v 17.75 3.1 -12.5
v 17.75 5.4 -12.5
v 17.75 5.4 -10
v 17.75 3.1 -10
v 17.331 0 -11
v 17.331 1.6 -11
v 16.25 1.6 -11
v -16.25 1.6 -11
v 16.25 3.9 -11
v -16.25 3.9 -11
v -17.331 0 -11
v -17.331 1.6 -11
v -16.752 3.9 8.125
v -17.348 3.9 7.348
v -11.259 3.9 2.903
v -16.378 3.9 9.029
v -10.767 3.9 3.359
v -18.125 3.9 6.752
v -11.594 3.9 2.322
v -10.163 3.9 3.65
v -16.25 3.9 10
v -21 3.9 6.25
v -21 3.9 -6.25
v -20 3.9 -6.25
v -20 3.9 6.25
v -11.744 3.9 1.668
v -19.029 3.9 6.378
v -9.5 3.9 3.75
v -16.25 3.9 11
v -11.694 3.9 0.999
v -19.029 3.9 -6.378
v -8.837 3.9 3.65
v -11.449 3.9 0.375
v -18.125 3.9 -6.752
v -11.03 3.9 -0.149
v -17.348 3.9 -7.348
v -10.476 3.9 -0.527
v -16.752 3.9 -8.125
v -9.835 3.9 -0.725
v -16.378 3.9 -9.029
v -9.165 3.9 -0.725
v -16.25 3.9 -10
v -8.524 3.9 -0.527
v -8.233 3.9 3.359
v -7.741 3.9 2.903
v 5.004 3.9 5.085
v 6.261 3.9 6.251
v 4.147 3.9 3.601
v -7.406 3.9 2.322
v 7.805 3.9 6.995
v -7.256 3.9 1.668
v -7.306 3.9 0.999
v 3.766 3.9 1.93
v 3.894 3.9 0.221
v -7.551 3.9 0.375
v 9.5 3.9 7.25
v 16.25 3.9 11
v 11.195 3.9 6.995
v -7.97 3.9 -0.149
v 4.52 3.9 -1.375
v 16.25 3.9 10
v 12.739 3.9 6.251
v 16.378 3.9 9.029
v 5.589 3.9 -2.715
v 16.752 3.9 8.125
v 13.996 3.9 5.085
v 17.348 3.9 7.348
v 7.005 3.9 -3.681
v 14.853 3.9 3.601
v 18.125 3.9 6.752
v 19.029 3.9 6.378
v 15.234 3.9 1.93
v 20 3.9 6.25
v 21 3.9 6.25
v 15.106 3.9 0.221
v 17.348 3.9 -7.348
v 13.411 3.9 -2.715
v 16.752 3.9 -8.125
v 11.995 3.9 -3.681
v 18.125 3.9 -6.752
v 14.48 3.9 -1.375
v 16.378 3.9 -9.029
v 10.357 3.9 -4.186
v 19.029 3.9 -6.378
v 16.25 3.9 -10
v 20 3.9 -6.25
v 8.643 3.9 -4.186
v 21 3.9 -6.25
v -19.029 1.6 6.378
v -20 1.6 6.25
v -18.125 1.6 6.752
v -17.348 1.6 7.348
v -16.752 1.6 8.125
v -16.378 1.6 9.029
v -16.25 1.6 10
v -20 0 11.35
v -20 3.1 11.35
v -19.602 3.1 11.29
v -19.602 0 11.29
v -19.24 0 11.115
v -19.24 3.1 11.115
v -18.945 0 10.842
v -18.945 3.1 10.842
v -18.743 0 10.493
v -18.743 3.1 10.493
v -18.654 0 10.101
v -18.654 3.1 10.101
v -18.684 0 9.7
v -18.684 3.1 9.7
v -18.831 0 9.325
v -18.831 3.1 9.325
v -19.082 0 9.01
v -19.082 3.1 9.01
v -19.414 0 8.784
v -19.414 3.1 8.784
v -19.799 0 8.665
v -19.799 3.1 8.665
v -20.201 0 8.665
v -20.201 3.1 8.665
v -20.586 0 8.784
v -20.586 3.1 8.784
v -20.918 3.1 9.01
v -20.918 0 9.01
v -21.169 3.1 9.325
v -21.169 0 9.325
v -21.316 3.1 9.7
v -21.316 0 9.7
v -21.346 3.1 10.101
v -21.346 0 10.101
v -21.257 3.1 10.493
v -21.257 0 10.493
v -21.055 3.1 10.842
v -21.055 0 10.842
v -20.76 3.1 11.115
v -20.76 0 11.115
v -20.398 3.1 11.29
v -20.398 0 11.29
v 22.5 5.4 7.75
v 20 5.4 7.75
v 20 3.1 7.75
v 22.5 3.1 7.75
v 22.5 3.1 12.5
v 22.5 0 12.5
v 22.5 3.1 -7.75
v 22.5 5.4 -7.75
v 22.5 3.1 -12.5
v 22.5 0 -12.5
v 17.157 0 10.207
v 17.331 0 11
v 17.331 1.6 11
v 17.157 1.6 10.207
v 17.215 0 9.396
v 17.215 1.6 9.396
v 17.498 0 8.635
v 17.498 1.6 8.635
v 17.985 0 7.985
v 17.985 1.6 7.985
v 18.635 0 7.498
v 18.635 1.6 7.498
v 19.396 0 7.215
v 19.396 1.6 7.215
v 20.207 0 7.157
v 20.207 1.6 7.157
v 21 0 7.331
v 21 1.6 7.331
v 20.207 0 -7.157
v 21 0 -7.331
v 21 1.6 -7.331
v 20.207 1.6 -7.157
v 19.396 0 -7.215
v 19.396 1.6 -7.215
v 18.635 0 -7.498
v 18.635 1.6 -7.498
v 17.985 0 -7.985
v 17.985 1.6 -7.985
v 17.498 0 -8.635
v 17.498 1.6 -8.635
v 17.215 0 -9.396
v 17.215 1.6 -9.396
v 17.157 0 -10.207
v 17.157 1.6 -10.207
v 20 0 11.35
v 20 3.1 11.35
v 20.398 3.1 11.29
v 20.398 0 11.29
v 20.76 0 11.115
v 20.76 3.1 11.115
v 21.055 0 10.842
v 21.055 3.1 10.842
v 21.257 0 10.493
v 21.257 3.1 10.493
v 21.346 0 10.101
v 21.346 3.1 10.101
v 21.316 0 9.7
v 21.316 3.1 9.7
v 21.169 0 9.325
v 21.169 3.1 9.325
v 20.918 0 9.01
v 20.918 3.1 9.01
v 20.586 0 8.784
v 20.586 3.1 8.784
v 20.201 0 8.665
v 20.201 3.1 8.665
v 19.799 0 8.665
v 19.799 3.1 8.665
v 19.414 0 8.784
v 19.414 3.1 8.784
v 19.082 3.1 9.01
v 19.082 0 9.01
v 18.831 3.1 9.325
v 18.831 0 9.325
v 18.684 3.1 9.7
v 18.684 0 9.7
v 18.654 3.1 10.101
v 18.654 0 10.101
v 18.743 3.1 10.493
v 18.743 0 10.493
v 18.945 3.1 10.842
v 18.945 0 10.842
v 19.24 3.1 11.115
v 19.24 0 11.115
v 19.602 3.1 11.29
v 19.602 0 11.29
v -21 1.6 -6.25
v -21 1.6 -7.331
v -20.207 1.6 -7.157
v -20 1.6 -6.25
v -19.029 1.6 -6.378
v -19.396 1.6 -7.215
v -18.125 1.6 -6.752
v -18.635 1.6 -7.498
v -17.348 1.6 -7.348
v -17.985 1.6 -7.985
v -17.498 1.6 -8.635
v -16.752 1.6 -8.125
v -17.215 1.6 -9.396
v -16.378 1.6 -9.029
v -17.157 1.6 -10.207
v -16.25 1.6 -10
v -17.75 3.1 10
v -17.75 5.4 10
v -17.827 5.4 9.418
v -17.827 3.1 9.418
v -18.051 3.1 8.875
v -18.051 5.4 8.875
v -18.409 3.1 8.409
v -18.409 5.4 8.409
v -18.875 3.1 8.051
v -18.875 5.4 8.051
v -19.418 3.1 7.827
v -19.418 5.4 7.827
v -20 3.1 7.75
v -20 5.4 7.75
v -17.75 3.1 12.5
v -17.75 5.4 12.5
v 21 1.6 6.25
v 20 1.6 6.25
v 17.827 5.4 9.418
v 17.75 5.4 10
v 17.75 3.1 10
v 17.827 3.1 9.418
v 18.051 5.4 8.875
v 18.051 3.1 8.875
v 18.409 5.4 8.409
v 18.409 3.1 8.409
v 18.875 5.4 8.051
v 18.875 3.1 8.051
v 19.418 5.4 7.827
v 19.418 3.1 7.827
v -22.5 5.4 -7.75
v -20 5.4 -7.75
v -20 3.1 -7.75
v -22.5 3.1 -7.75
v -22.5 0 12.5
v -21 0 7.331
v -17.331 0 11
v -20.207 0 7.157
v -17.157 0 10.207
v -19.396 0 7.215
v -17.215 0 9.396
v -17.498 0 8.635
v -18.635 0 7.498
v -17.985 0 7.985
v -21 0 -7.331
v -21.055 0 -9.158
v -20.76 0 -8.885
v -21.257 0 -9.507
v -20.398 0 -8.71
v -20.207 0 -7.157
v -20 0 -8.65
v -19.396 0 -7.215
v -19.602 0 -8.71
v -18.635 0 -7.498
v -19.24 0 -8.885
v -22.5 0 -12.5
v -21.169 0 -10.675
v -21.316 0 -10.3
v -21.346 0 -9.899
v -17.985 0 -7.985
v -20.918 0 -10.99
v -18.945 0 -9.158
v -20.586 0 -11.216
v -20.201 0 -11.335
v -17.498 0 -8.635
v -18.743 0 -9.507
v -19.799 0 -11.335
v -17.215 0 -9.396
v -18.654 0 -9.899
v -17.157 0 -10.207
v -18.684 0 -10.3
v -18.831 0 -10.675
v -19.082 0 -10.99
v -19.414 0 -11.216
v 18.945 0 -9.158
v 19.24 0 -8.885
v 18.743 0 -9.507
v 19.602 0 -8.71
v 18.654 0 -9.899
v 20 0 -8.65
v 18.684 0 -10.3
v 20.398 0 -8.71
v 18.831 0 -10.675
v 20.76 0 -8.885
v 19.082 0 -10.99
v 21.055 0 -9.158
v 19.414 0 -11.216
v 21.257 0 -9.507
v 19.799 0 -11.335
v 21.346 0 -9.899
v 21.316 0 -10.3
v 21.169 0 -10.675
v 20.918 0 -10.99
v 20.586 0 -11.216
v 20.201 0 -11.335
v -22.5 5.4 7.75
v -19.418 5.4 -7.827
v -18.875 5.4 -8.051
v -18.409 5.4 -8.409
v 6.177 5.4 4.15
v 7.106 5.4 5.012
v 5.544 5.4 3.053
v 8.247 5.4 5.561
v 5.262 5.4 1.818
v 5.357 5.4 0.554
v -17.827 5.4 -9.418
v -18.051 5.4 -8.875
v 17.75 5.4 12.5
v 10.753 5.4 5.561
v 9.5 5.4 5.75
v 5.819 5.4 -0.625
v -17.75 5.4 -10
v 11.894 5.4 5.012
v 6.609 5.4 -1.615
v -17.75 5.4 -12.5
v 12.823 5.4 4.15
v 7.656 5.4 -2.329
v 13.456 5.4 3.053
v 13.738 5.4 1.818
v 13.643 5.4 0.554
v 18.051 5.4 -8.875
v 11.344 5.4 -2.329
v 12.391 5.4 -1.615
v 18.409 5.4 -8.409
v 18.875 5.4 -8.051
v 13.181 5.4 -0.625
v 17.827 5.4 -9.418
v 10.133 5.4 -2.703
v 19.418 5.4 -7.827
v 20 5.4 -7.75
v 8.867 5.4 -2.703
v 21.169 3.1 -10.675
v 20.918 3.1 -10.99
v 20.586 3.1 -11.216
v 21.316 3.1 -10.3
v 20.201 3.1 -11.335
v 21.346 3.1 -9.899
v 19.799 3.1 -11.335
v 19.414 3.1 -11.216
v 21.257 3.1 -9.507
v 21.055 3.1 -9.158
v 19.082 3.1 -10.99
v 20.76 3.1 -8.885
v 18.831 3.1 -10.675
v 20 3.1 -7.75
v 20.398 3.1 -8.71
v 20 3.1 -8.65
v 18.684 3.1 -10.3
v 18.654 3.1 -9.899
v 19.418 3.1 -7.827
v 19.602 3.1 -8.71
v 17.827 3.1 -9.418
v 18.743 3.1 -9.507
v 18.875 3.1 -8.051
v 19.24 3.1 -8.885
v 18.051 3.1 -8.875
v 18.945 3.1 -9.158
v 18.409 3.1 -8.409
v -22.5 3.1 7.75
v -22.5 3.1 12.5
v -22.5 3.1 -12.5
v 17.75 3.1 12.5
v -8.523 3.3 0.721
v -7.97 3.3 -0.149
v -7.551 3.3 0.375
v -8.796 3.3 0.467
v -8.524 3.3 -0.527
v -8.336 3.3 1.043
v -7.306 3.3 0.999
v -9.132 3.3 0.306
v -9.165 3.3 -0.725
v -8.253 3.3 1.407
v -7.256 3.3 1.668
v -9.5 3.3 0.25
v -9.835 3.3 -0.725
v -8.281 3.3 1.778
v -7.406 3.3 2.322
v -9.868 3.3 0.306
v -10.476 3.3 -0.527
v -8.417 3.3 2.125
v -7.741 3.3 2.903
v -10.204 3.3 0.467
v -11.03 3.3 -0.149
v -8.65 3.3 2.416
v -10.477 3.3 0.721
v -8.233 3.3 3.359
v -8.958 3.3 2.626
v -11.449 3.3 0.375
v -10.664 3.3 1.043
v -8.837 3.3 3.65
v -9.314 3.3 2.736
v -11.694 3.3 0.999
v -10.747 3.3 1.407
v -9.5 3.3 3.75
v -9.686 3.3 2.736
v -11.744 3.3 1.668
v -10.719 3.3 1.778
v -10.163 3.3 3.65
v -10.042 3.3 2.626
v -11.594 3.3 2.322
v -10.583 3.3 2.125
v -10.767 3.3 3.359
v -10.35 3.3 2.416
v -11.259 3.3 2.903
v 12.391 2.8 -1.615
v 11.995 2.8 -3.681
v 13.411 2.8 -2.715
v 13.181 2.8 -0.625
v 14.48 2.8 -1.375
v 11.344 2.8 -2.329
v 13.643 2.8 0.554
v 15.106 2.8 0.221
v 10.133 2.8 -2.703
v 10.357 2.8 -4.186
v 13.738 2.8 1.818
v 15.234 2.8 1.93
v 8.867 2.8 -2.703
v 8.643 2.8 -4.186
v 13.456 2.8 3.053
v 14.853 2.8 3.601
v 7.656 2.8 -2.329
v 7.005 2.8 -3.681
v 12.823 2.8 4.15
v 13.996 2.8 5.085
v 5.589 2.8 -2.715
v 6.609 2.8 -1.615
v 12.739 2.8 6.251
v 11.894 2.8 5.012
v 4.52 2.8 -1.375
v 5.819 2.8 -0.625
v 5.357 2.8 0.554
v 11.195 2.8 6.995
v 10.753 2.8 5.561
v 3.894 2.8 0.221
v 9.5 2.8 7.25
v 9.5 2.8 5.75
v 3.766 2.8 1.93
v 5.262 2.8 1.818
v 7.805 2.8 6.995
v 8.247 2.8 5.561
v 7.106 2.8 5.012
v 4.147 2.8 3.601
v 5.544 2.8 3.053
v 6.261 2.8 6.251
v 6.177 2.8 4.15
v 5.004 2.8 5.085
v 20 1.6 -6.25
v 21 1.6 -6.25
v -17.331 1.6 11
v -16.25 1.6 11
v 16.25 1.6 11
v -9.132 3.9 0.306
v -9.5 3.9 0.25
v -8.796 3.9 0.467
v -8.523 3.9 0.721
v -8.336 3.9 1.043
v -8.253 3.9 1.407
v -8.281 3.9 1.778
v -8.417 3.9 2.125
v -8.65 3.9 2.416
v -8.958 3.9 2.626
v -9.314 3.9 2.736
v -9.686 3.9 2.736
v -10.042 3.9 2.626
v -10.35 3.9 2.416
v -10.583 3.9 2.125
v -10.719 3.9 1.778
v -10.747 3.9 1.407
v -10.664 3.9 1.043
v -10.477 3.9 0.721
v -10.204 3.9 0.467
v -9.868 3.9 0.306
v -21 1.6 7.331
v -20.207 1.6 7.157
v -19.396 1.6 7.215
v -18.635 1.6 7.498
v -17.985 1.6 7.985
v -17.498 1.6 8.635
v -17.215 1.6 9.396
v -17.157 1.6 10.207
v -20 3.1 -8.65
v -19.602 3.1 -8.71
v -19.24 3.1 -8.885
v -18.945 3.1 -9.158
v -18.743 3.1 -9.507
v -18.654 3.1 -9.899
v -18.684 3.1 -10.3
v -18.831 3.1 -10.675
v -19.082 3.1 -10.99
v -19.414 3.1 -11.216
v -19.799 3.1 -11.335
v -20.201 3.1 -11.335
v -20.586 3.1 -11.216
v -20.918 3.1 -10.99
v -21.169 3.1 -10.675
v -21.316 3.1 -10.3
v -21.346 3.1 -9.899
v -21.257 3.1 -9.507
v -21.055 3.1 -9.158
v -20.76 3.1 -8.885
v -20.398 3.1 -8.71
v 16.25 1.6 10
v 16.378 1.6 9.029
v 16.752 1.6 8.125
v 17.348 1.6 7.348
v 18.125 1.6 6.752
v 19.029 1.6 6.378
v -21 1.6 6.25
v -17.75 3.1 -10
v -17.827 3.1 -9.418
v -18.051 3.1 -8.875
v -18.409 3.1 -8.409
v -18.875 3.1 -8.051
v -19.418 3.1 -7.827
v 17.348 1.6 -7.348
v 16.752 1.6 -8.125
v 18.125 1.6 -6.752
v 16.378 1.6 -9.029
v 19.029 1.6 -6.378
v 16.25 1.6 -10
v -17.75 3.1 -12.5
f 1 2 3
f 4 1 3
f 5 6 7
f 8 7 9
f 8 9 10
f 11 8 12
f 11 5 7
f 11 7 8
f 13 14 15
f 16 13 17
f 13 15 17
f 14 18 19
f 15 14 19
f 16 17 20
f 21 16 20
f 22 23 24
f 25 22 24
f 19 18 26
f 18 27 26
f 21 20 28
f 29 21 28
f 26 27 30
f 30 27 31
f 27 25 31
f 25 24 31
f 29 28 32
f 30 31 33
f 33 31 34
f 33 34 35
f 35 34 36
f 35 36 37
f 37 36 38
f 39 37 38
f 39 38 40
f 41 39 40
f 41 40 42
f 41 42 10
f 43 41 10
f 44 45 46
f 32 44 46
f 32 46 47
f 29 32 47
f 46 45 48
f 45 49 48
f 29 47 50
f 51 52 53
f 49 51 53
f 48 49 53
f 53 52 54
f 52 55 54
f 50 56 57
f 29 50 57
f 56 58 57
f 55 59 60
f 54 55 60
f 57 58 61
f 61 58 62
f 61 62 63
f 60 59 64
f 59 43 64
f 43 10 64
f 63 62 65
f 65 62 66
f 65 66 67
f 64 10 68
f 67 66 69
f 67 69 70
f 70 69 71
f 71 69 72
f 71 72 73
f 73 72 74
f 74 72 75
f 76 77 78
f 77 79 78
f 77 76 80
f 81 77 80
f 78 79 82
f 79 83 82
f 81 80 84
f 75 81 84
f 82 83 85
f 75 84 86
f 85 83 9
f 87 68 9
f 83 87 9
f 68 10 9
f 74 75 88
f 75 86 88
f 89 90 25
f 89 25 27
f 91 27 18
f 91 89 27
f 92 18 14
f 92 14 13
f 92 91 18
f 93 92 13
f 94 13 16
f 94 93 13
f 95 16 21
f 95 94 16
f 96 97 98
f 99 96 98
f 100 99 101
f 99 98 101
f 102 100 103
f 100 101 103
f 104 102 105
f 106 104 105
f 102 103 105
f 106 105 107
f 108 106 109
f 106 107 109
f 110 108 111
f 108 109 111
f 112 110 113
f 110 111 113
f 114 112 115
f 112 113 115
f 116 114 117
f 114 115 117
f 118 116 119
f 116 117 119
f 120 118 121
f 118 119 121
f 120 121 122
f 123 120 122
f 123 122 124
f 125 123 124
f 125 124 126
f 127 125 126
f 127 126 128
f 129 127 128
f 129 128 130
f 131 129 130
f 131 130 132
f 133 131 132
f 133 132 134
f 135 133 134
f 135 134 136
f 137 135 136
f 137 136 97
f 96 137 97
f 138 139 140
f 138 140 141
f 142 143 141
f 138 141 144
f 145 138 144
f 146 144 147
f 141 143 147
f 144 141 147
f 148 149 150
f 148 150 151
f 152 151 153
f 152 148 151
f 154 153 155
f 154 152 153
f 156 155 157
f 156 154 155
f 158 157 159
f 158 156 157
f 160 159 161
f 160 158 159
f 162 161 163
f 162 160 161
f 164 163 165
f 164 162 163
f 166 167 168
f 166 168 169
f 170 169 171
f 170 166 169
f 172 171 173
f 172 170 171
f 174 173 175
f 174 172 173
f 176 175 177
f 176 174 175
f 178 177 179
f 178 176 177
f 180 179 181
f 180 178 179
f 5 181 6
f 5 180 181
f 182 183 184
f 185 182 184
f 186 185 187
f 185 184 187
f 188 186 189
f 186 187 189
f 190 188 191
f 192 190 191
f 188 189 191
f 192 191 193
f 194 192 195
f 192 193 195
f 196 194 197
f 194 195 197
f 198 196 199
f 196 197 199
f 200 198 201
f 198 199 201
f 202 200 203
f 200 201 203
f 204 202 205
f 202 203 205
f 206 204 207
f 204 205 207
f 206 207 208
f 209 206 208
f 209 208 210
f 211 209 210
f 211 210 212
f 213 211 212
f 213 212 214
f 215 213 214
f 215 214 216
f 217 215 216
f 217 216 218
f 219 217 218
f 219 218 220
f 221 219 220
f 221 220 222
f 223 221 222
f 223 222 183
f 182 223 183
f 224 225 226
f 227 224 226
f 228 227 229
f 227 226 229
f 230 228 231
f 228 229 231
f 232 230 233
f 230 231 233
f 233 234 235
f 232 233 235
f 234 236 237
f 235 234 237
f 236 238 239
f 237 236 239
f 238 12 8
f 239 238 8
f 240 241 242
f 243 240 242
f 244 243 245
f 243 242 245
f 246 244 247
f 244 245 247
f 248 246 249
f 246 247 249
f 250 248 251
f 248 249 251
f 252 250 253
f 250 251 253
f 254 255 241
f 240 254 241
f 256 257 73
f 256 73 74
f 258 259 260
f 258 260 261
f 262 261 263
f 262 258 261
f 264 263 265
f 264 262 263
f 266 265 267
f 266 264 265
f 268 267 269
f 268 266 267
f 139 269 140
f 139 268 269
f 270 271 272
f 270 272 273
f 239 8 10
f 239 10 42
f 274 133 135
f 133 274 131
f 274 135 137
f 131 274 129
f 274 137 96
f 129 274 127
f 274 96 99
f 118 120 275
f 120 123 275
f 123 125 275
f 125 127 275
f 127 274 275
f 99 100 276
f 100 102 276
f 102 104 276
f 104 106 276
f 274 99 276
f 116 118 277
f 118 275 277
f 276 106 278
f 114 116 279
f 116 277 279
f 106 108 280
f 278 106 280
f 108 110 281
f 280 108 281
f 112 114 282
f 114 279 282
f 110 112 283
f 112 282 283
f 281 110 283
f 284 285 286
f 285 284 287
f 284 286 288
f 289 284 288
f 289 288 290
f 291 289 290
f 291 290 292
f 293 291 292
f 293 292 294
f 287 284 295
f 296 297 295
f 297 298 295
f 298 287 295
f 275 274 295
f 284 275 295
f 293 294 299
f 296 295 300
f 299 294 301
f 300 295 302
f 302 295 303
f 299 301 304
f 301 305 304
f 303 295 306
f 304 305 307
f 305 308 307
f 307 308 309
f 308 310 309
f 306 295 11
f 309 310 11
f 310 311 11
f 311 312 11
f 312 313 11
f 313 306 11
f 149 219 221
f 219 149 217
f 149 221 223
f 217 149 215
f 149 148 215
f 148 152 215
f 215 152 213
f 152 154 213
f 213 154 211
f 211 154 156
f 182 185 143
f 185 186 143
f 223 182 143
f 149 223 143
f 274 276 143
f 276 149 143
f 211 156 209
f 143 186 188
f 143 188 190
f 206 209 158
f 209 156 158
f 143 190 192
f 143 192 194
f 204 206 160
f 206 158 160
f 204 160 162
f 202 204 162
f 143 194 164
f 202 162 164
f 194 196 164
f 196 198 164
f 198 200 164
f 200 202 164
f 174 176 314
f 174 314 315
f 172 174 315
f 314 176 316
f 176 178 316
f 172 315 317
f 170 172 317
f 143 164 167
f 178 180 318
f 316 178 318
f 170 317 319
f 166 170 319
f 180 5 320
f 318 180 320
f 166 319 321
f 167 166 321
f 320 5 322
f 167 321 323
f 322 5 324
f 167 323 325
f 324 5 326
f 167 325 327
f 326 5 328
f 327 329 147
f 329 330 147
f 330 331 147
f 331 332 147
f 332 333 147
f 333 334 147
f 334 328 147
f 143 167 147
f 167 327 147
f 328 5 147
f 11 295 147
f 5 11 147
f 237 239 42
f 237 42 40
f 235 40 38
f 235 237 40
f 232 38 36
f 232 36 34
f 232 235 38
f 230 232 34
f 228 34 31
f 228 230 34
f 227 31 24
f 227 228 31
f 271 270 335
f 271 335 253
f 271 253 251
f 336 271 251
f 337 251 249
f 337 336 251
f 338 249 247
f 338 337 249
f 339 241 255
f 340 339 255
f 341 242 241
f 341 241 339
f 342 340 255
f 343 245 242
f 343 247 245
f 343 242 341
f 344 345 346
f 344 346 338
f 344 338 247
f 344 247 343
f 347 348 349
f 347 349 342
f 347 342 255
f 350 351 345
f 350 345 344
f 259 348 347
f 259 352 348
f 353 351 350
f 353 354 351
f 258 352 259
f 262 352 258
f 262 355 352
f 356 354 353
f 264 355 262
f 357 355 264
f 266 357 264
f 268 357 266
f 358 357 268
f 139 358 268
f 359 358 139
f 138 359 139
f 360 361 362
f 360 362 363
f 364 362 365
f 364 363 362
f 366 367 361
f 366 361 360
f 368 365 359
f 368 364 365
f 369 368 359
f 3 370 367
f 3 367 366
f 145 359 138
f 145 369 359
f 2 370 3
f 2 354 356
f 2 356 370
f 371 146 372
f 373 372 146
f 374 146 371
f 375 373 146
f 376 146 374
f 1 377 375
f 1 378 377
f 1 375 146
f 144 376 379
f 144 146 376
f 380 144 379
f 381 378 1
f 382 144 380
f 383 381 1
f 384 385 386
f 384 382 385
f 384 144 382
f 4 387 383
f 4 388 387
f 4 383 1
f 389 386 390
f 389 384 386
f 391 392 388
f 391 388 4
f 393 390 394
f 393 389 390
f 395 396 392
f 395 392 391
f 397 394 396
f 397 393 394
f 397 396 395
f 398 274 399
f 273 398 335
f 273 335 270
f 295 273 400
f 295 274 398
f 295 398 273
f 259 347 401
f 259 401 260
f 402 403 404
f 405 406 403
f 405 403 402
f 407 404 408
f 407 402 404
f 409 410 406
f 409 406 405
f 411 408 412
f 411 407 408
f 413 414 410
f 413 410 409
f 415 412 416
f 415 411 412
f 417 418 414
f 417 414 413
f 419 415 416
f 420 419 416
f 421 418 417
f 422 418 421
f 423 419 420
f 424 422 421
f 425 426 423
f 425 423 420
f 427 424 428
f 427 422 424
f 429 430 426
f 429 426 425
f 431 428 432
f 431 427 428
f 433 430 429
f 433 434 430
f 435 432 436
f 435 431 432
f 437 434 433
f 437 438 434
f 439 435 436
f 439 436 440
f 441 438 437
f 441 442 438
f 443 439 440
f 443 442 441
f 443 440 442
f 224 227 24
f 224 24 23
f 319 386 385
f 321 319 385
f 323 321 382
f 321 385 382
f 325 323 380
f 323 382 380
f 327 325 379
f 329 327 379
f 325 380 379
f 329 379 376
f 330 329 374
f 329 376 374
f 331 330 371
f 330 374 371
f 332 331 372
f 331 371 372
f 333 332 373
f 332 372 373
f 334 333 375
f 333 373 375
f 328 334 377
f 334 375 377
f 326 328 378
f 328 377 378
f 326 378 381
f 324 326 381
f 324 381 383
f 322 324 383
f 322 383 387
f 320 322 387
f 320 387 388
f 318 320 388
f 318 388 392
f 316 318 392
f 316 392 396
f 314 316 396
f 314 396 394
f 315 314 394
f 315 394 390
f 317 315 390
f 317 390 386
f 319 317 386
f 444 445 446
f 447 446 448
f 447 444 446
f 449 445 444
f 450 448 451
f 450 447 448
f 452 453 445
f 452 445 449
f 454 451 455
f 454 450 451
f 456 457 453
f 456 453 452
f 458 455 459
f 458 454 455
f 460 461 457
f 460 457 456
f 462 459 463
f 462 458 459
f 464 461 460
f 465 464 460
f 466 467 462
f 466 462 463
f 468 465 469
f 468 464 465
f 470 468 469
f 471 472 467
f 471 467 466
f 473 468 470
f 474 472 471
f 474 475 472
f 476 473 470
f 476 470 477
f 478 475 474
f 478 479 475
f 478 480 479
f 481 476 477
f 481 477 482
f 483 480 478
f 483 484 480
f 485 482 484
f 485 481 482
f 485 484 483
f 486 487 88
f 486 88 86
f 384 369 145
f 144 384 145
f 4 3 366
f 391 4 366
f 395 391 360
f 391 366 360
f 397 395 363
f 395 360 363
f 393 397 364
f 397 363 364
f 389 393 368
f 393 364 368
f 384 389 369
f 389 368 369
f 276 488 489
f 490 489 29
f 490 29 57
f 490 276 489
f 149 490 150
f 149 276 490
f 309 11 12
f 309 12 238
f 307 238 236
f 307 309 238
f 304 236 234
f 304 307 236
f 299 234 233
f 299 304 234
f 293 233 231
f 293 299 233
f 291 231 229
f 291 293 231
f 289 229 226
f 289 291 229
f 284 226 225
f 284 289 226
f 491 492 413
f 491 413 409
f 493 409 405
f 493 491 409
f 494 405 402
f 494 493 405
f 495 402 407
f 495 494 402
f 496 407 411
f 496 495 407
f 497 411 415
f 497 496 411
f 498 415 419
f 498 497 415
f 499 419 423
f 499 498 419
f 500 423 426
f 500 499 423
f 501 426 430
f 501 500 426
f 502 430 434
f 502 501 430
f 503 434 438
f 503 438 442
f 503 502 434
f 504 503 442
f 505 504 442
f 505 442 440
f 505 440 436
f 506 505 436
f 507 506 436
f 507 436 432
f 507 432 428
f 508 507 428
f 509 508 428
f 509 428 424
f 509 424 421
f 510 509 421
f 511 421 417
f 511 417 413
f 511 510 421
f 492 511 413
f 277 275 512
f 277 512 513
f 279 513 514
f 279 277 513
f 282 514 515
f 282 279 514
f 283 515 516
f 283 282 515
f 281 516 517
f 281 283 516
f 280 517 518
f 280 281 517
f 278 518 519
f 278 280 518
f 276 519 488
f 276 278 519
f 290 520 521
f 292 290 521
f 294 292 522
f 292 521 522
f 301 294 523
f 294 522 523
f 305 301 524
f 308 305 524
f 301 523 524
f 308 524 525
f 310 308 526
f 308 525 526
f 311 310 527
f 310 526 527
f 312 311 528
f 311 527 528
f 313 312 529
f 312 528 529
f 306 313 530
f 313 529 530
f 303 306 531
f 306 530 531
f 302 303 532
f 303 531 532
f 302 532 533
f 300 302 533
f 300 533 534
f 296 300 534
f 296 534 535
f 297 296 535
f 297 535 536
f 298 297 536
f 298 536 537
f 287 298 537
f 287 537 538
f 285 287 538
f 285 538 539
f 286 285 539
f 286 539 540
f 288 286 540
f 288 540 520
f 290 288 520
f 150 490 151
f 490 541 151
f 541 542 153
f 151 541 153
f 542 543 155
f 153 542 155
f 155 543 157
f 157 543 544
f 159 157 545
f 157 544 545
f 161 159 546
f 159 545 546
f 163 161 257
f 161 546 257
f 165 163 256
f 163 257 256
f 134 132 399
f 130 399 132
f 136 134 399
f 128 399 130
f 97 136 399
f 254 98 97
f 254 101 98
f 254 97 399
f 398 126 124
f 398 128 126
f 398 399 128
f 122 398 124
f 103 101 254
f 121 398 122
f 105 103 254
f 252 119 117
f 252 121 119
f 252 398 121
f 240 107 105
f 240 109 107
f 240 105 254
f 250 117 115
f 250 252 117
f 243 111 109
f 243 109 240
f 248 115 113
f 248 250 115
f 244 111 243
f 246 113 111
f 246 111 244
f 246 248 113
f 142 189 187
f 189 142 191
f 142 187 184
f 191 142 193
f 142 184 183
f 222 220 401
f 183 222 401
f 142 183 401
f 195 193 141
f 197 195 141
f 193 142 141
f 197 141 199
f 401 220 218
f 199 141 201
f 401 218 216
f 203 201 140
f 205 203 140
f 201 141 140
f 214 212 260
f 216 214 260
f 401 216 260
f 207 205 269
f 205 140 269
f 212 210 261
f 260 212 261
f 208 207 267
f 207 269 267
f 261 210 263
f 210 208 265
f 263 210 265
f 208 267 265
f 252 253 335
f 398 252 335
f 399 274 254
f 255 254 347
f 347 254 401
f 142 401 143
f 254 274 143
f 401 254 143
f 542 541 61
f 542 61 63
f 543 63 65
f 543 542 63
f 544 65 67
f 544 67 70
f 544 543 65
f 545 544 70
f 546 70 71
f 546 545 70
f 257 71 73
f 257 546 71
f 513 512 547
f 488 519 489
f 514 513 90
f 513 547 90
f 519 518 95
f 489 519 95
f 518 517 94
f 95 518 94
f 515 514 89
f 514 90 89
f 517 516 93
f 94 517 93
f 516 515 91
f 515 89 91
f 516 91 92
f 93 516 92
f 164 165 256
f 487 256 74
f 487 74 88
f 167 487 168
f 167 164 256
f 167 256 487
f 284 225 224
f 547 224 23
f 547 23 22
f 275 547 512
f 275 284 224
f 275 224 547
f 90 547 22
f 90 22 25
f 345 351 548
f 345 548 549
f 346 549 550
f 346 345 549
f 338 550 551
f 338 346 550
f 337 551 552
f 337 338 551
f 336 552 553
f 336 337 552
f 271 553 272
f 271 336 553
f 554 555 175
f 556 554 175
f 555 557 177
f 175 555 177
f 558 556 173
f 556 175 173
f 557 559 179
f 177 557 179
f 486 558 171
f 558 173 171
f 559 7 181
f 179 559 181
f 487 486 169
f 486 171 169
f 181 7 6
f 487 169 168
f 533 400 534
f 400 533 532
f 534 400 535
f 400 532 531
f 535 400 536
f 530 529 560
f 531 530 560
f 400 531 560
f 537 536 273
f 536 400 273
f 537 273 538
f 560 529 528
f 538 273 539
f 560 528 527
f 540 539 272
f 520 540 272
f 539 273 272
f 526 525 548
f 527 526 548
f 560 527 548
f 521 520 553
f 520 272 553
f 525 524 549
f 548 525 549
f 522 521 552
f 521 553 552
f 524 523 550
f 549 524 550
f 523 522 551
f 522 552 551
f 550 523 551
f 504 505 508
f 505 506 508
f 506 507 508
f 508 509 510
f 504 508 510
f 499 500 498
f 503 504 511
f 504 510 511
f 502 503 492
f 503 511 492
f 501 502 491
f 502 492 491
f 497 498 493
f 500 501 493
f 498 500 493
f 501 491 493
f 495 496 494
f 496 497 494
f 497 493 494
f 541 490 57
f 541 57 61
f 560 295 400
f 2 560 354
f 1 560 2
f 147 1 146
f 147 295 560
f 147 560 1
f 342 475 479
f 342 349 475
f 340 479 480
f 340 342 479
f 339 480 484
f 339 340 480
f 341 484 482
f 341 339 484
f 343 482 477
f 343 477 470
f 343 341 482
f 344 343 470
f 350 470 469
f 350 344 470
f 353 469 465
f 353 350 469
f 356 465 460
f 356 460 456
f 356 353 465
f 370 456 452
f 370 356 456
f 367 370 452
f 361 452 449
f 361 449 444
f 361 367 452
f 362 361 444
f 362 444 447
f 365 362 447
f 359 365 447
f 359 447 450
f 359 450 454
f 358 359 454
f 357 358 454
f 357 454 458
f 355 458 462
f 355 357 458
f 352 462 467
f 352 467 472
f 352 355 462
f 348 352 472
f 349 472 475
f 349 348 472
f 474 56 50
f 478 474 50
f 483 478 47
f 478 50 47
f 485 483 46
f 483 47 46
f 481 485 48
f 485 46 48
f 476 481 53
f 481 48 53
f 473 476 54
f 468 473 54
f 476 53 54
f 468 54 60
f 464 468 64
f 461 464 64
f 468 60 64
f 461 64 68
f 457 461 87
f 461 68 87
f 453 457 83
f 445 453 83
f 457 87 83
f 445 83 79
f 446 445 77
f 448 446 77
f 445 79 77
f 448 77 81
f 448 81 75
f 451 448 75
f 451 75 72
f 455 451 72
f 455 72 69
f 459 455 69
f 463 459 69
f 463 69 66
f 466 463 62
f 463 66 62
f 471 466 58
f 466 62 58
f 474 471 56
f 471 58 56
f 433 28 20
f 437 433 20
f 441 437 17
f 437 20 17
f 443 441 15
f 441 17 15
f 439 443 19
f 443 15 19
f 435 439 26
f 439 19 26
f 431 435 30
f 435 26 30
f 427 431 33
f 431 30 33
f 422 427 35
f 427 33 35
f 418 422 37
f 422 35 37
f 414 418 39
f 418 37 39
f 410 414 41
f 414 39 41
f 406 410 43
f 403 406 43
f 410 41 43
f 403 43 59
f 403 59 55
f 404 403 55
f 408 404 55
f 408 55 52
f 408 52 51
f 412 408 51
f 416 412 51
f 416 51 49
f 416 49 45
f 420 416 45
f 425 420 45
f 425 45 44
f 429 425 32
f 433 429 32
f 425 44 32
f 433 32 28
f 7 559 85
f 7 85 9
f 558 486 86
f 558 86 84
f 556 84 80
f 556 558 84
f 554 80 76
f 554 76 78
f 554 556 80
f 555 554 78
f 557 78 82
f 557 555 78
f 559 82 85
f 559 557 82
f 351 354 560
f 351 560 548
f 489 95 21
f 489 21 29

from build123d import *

# Parameters (mm, degrees)
SKETCH_1_W            = 45
SKETCH_1_H            = 25
EXTRUDE_1_DEPTH       = 5.4
SKETCH_2_R            = 1.35
CUT_EXTRUDE_1_DEPTH   = 27.299429652
CUT_EXTRUDE_2_DEPTH   = 2.3
MIRROR_2_COPY_1_DEPTH = 2.3
SHELL_1_DEPTH         = 3.9
SHELL_1_2_DEPTH       = 1.6
SKETCH_4_R            = 4.25
CUT_EXTRUDE_3_DEPTH   = 27.299429652
SKETCH_6_R            = 5.75
SKETCH_6_R_2          = 4.25
EXTRUDE_3_DEPTH       = 1.1
SKETCH_7_R            = 2.25
SKETCH_7_R_2          = 1.25
EXTRUDE_4_DEPTH       = 0.6


# Read off the part's stored shape, not the designer's step: 薄殼1
with BuildPart() as part:
    # 草圖1 → 填料-伸長1 (new body)
    with BuildSketch(Plane(origin=(0, 0, 0), x_dir=(1, 0, 0), z_dir=(0, 1, 0))):
        Rectangle(SKETCH_1_W, SKETCH_1_H)
    extrude(amount=EXTRUDE_1_DEPTH)

    # 草圖2 → 除料-伸長1 (cut, through all)
    with BuildSketch(Plane(origin=(0, 5.4, 0), x_dir=(1, 0, 0), z_dir=(0, 1, 0))):
        with Locations(Location((-20, 10, 0), (0, 0, 270))):
            Circle(SKETCH_2_R)
        with Locations(Location((-20, -10, 0), (0, 0, 270))):
            Circle(SKETCH_2_R)
        with Locations(Location((20, -10, 0), (0, 0, 270))):
            Circle(SKETCH_2_R)
        with Locations(Location((20, 10, 0), (0, 0, 270))):
            Circle(SKETCH_2_R)
    extrude(amount=-CUT_EXTRUDE_1_DEPTH, mode=Mode.SUBTRACT)

    # 草圖3 → 除料-伸長2 (cut)
    with BuildSketch(Plane(origin=(0, 5.4, 0), x_dir=(1, 0, 0), z_dir=(0, 1, 0))):
        with BuildLine():
            Line((-20, -7.75), (-22.5, -7.75))
            Line((-22.5, -7.75), (-22.5, -12.5))
            Line((-22.5, -12.5), (-17.75, -12.5))
            Line((-17.75, -12.5), (-17.75, -10))
            ThreePointArc((-17.75, -10), (-18.409009742, -8.409009742), (-20, -7.75))
        make_face()
    cut_extrude_2 = extrude(amount=-CUT_EXTRUDE_2_DEPTH, mode=Mode.SUBTRACT)

    # 鏡射1: 除料-伸長2 across plane
    add(cut_extrude_2.mirror(Plane.XY), mode=Mode.SUBTRACT)

    # 鏡射2: 除料-伸長2 across plane
    add(cut_extrude_2.mirror(Plane(origin=(0, 0, 0), x_dir=(0, 0, 1), z_dir=(1, 0, 0))), mode=Mode.SUBTRACT)

    # 鏡射2 copy 1 sketch → 鏡射2 copy 1 (cut)
    with BuildSketch(Plane(origin=(0, 5.4, 0), x_dir=(-1, 0, 0), z_dir=(0, 1, 0))):
        with BuildLine():
            Line((-20, -7.75), (-22.5, -7.75))
            Line((-22.5, -7.75), (-22.5, -12.5))
            Line((-22.5, -12.5), (-17.75, -12.5))
            Line((-17.75, -12.5), (-17.75, -10))
            ThreePointArc((-17.75, -10), (-18.409009742, -8.409009742), (-20, -7.75))
        make_face()
    extrude(amount=-MIRROR_2_COPY_1_DEPTH, mode=Mode.SUBTRACT)

    # 薄殼1 outline → 薄殼1 (cut)
    with BuildSketch(Plane(origin=(0, 0, 0), x_dir=(1, 0, 0), z_dir=(0, 1, 0))):
        with BuildLine():
            Line((-16.25, -11), (16.25, -11))
            Line((16.25, -11), (16.25, -10))
            ThreePointArc((16.25, -10), (17.348349571, -7.348349571), (20, -6.25))
            Line((20, -6.25), (21, -6.25))
            Line((21, -6.25), (21, 6.25))
            Line((21, 6.25), (20, 6.25))
            ThreePointArc((20, 6.25), (17.348349571, 7.348349571), (16.25, 10))
            Line((16.25, 10), (16.25, 11))
            Line((16.25, 11), (-16.25, 11))
            Line((-16.25, 11), (-16.25, 10))
            ThreePointArc((-16.25, 10), (-17.348349571, 7.348349571), (-20, 6.25))
            Line((-20, 6.25), (-21, 6.25))
            Line((-21, 6.25), (-21, -6.25))
            Line((-21, -6.25), (-20, -6.25))
            ThreePointArc((-20, -6.25), (-17.348349571, -7.348349571), (-16.25, -10))
            Line((-16.25, -10), (-16.25, -11))
        make_face()
    extrude(amount=SHELL_1_DEPTH, mode=Mode.SUBTRACT)

    # Shell 1 2 outline → Shell 1 2 (cut)
    with BuildSketch(Plane(origin=(0, 0, 0), x_dir=(1, 0, 0), z_dir=(0, 1, 0))):
        with BuildLine():
            Line((16.25, -11), (17.331198771, -11))
            ThreePointArc((17.331198771, -11), (17.984745674, -7.984745674), (21, -7.331198771))
            Line((21, -7.331198771), (21, -6.25))
            Line((21, -6.25), (20, -6.25))
            ThreePointArc((20, -6.25), (17.348349571, -7.348349571), (16.25, -10))
            Line((16.25, -10), (16.25, -11))
        make_face()
        with BuildLine():
            Line((-17.331198771, -11), (-16.25, -11))
            Line((-16.25, -11), (-16.25, -10))
            ThreePointArc((-16.25, -10), (-17.348349571, -7.348349571), (-20, -6.25))
            Line((-20, -6.25), (-21, -6.25))
            Line((-21, -6.25), (-21, -7.331198771))
            ThreePointArc((-21, -7.331198771), (-17.984745674, -7.984745674), (-17.331198771, -11))
        make_face()
        with BuildLine():
            Line((20, 6.25), (21, 6.25))
            Line((21, 6.25), (21, 7.331198771))
            ThreePointArc((21, 7.331198771), (17.984745674, 7.984745674), (17.331198771, 11))
            Line((17.331198771, 11), (16.25, 11))
            Line((16.25, 11), (16.25, 10))
            ThreePointArc((16.25, 10), (17.348349571, 7.348349571), (20, 6.25))
        make_face()
        with BuildLine():
            Line((-21, 7.331198771), (-21, 6.25))
            Line((-21, 6.25), (-20, 6.25))
            ThreePointArc((-20, 6.25), (-17.348349571, 7.348349571), (-16.25, 10))
            Line((-16.25, 10), (-16.25, 11))
            Line((-16.25, 11), (-17.331198771, 11))
            ThreePointArc((-17.331198771, 11), (-17.984745674, 7.984745674), (-21, 7.331198771))
        make_face()
    extrude(amount=SHELL_1_2_DEPTH, mode=Mode.SUBTRACT)

    # 草圖4 → 除料-伸長3 (cut, through all)
    with BuildSketch(Plane(origin=(0, 5.4, 0), x_dir=(1, 0, 0), z_dir=(0, 1, 0))):
        with Locations(Location((9.5, -1.5, 0), (0, 0, 270))):
            Circle(SKETCH_4_R)
    extrude(amount=-CUT_EXTRUDE_3_DEPTH, mode=Mode.SUBTRACT)

    # 草圖6 → 填料-伸長3 (add)
    with BuildSketch(Plane.XZ.offset(-3.9)):
        with Locations(Location((9.5, 1.5, 0), (0, 0, 90))):
            Circle(SKETCH_6_R)
        with Locations(Location((9.5, 1.5, 0), (0, 0, 90))):
            Circle(SKETCH_6_R_2, mode=Mode.SUBTRACT)
    extrude(amount=EXTRUDE_3_DEPTH)

    # 草圖7 → 填料-伸長4 (add)
    with BuildSketch(Plane.XZ.offset(-3.9)):
        with Locations(Location((-9.5, 1.5, 0), (0, 0, 90))):
            Circle(SKETCH_7_R)
        with Locations(Location((-9.5, 1.5, 0), (0, 0, 270))):
            Circle(SKETCH_7_R_2, mode=Mode.SUBTRACT)
    extrude(amount=EXTRUDE_4_DEPTH)


solid = part.part
